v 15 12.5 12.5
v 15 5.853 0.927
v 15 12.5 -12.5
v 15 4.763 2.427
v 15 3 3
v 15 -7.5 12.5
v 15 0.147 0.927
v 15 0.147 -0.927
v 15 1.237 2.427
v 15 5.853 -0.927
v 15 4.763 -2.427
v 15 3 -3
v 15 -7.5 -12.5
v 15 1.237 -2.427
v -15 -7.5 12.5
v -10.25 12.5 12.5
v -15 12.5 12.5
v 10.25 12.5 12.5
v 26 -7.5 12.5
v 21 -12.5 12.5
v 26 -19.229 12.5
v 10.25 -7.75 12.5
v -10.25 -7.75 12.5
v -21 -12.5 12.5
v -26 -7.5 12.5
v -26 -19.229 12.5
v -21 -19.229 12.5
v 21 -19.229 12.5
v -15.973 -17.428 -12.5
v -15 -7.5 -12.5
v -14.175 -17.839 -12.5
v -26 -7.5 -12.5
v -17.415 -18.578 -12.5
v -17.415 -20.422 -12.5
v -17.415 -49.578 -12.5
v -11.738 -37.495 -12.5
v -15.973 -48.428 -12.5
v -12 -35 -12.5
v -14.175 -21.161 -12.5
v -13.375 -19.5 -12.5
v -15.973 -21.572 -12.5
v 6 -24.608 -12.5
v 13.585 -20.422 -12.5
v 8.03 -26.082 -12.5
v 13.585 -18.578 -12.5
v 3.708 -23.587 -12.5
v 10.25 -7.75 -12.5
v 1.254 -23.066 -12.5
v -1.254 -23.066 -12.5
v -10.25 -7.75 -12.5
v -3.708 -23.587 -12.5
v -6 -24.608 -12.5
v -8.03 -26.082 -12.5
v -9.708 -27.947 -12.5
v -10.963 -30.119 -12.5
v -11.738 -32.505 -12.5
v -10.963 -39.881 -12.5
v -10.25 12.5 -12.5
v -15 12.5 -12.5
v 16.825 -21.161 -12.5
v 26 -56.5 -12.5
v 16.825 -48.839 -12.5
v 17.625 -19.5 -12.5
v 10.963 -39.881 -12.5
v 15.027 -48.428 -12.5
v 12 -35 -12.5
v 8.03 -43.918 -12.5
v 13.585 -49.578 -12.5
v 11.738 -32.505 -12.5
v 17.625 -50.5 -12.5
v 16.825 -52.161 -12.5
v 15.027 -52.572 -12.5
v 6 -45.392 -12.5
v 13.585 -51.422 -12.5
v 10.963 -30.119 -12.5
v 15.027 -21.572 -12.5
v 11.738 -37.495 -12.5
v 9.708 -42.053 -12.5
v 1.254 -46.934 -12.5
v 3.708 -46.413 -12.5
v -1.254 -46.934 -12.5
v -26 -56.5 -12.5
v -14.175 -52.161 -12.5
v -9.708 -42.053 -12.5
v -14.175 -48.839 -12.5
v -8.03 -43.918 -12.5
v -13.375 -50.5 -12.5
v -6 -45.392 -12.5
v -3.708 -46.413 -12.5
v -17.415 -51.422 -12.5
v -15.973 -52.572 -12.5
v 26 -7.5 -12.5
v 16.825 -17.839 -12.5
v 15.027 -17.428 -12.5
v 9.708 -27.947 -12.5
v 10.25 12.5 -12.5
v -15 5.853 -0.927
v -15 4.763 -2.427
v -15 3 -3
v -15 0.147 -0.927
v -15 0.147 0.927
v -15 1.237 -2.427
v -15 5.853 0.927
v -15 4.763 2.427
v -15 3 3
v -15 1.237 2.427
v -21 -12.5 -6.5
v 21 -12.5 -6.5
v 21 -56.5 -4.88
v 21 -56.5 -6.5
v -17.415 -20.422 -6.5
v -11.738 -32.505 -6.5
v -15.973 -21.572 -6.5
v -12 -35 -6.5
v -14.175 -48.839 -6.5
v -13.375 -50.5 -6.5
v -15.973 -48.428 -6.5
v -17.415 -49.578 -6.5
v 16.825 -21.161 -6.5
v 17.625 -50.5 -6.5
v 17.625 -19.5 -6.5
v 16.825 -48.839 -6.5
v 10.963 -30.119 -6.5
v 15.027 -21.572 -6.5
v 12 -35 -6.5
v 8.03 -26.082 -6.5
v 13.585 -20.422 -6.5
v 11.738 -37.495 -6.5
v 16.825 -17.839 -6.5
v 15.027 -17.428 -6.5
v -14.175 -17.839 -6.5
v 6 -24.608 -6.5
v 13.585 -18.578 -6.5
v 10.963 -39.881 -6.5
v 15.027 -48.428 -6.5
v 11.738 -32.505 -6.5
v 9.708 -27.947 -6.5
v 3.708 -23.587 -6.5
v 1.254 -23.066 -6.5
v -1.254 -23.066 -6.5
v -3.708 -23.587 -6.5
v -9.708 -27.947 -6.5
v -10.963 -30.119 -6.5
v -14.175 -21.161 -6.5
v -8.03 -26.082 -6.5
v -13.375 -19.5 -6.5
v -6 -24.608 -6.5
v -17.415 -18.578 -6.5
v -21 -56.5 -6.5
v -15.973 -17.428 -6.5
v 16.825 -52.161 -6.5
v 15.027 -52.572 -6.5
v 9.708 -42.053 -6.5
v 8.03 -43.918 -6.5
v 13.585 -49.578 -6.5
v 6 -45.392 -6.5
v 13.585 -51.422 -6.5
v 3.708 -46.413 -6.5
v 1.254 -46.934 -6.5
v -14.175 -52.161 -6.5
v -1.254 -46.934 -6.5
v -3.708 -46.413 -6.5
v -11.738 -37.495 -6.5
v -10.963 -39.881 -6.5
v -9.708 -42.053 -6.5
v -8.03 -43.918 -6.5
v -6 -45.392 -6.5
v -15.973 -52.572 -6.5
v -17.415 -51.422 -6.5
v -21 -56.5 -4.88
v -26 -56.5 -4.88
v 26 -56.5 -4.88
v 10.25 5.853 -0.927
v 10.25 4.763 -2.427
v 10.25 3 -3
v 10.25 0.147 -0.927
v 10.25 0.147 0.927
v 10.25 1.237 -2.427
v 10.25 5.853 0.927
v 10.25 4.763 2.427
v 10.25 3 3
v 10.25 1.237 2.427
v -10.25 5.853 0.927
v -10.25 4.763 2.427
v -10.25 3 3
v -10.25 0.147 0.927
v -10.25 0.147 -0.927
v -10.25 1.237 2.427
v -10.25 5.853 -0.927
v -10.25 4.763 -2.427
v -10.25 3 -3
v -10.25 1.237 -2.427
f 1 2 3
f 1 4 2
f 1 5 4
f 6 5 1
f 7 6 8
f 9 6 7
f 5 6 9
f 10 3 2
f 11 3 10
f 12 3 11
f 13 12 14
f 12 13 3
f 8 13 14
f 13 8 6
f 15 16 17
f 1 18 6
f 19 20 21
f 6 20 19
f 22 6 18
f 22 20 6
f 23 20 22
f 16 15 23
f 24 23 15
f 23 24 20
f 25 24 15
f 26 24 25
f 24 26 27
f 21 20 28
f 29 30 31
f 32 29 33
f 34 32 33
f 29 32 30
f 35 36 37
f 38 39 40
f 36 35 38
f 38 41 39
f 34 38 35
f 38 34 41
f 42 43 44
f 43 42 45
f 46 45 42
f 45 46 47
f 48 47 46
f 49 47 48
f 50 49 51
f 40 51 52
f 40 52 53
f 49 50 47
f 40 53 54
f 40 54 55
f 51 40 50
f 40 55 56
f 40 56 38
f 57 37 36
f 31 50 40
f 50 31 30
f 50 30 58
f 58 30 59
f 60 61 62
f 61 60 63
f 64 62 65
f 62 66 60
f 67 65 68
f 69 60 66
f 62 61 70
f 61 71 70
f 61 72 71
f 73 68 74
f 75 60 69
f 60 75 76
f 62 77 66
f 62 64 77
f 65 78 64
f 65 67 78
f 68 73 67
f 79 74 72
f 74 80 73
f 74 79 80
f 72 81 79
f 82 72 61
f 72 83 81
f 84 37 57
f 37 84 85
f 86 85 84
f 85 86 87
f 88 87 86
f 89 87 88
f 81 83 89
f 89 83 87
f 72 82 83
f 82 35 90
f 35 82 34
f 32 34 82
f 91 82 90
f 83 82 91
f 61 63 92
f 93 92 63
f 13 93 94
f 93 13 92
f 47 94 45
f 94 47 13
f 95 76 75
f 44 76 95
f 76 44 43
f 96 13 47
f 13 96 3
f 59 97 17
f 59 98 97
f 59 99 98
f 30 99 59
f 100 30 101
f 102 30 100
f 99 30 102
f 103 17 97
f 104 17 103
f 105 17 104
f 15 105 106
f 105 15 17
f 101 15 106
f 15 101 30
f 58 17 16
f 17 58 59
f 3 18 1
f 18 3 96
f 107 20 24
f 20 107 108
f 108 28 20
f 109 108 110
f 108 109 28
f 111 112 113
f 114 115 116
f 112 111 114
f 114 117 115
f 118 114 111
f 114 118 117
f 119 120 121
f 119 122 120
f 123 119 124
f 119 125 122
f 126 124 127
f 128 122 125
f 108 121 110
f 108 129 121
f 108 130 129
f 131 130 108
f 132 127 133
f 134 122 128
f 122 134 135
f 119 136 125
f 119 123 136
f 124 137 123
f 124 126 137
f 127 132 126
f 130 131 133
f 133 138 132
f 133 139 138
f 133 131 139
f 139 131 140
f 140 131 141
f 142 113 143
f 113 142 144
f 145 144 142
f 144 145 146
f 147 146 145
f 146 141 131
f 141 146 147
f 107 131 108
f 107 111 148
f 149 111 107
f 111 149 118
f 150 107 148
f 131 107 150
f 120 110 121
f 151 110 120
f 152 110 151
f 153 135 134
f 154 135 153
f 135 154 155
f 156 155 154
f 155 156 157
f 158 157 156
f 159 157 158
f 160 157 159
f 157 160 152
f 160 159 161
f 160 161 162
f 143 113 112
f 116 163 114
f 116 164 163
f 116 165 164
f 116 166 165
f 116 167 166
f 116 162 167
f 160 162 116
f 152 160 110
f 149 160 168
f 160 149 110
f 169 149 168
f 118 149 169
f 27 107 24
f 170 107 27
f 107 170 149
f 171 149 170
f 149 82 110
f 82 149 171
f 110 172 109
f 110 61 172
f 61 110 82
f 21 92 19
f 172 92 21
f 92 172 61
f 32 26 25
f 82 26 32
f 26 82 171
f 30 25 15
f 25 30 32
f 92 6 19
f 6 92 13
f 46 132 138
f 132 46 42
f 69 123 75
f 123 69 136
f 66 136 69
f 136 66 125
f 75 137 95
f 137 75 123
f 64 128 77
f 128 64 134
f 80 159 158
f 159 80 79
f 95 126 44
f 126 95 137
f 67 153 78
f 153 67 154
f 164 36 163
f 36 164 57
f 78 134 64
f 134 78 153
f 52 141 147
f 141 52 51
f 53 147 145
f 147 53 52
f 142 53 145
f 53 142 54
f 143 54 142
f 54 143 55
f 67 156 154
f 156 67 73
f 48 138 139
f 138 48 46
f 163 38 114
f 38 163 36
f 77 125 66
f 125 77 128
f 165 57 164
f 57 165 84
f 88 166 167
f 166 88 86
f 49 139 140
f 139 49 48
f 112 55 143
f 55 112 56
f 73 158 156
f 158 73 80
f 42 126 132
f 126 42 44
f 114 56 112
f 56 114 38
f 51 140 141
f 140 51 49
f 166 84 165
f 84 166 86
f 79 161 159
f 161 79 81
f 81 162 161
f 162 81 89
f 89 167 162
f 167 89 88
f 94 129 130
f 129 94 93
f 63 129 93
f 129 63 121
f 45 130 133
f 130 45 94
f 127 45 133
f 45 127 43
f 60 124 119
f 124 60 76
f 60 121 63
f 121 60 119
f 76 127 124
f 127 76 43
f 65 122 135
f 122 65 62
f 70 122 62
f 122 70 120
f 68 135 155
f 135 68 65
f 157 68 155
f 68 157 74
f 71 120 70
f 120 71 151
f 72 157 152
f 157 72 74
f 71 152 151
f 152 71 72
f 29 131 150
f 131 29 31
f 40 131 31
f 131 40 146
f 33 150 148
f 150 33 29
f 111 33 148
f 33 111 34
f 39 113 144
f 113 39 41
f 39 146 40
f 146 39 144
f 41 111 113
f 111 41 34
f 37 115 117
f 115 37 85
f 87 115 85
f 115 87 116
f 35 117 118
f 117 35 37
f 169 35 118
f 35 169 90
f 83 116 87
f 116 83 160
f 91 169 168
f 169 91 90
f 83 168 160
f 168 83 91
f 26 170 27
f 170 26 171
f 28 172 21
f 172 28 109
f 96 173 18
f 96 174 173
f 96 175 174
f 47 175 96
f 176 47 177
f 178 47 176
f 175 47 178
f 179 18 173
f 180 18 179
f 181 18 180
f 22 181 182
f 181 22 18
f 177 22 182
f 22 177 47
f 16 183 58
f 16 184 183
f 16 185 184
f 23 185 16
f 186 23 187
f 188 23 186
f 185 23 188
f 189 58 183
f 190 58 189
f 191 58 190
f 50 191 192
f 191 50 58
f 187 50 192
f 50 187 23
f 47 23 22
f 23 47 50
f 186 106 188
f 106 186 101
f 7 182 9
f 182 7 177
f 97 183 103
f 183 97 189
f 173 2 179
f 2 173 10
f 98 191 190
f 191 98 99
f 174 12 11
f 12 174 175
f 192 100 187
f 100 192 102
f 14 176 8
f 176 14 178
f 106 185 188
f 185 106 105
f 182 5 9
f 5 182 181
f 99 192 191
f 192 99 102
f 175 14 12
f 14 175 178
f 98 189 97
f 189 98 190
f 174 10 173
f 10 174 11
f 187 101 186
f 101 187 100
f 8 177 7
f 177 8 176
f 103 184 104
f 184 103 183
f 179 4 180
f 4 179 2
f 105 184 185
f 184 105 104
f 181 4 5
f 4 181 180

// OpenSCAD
// file: Rook_Config.scad
// Rook 3D Printer Configuration
// Created By Jeffrey Olijar 
// Jolijar@gmail.com

// Layer Height
LH = 0.38;

// 608 skate bearing
Bearing_OD = 23; 
Bearing_ID = 8;
Bearing_H = 7;

// M3 Nut Diameter
N3 = 7.5;

// M3 Screw Hole Diameter
M3 = 4.25;

// M4 Screw Hole Diameter
M4 = 5.25;
N4 = 8.75;

// M5 Screw Hole Diameter
M5 = 6;

// M8 Rod Diameter (configure for a tight fit)
M8 = 8.2;

// M8 Nut Diameter
N8 = 15.5;

//LM8UU Bearing
LBD = 15.4; // Diameter
LBH = 25; // Height
LBI = 8;  // Inner Diameter

//Makergear Groovemount
GVO = 16.5; // Outside Diameter
GVI = 12.5;  // Inside Groove Diameter

// Distance Between Centers for X rods
DBCX = 70;
// main file
// Rook 3D Printer 
// Z Motor Holder
// Created By Jeffrey Olijar 
// Jolijar@gmail.com
// Revision 1.00
// 2 x requred 


include <Rook_Config.scad>

module Rook_Z_Motor(){

difference(){ 
union(){
// Misumi Rail Box
translate(v=[0,0,0]){ cube(size = [30,25,25], center = true);}

// Stepper Motor Holder
translate(v=[0,-34.5,-9.5]){ cube(size = [42,44,6], center = true);}
translate(v=[23.5,-34.5,0]){ cube(size = [5,44,25], center = true);}
translate(v=[-23.5,-34.5,0]){ cube(size = [5,44,25], center = true);}
translate(v=[0,-10,0]){ cube(size = [52,5,25], center = true);}
}

union(){
// Misumi Rail Cutout
translate(v=[0,2.5,0]){ cube(size = [20.5,20.5,26], center = true);}
translate(v=[-20,3,0])rotate(a=[0,90,0]){cylinder(h=100,r=M5/2);}
// Stepper Motor Holes
translate(v=[0,-25,-15]){
	translate(v=[0,-10,-10]){cylinder(h=20,r=12);
	translate(v=[15.5,15.5,0]){cylinder(h=20,r= M3/2);}
	translate(v=[15.5,-15.5,0]){cylinder(h=20,r=M3/2);}
	translate(v=[-15.5,15.5,0]){cylinder(h=20,r=M3/2);}
	translate(v=[-15.5,-15.5,0]){cylinder(h=20,r=M3/2);}
	}
translate(v=[0,-18,44])rotate(a=[25,0,0]){ 
cube(size = [58,67,50], center = true);
}
}}}}
Rook_Z_Motor();
